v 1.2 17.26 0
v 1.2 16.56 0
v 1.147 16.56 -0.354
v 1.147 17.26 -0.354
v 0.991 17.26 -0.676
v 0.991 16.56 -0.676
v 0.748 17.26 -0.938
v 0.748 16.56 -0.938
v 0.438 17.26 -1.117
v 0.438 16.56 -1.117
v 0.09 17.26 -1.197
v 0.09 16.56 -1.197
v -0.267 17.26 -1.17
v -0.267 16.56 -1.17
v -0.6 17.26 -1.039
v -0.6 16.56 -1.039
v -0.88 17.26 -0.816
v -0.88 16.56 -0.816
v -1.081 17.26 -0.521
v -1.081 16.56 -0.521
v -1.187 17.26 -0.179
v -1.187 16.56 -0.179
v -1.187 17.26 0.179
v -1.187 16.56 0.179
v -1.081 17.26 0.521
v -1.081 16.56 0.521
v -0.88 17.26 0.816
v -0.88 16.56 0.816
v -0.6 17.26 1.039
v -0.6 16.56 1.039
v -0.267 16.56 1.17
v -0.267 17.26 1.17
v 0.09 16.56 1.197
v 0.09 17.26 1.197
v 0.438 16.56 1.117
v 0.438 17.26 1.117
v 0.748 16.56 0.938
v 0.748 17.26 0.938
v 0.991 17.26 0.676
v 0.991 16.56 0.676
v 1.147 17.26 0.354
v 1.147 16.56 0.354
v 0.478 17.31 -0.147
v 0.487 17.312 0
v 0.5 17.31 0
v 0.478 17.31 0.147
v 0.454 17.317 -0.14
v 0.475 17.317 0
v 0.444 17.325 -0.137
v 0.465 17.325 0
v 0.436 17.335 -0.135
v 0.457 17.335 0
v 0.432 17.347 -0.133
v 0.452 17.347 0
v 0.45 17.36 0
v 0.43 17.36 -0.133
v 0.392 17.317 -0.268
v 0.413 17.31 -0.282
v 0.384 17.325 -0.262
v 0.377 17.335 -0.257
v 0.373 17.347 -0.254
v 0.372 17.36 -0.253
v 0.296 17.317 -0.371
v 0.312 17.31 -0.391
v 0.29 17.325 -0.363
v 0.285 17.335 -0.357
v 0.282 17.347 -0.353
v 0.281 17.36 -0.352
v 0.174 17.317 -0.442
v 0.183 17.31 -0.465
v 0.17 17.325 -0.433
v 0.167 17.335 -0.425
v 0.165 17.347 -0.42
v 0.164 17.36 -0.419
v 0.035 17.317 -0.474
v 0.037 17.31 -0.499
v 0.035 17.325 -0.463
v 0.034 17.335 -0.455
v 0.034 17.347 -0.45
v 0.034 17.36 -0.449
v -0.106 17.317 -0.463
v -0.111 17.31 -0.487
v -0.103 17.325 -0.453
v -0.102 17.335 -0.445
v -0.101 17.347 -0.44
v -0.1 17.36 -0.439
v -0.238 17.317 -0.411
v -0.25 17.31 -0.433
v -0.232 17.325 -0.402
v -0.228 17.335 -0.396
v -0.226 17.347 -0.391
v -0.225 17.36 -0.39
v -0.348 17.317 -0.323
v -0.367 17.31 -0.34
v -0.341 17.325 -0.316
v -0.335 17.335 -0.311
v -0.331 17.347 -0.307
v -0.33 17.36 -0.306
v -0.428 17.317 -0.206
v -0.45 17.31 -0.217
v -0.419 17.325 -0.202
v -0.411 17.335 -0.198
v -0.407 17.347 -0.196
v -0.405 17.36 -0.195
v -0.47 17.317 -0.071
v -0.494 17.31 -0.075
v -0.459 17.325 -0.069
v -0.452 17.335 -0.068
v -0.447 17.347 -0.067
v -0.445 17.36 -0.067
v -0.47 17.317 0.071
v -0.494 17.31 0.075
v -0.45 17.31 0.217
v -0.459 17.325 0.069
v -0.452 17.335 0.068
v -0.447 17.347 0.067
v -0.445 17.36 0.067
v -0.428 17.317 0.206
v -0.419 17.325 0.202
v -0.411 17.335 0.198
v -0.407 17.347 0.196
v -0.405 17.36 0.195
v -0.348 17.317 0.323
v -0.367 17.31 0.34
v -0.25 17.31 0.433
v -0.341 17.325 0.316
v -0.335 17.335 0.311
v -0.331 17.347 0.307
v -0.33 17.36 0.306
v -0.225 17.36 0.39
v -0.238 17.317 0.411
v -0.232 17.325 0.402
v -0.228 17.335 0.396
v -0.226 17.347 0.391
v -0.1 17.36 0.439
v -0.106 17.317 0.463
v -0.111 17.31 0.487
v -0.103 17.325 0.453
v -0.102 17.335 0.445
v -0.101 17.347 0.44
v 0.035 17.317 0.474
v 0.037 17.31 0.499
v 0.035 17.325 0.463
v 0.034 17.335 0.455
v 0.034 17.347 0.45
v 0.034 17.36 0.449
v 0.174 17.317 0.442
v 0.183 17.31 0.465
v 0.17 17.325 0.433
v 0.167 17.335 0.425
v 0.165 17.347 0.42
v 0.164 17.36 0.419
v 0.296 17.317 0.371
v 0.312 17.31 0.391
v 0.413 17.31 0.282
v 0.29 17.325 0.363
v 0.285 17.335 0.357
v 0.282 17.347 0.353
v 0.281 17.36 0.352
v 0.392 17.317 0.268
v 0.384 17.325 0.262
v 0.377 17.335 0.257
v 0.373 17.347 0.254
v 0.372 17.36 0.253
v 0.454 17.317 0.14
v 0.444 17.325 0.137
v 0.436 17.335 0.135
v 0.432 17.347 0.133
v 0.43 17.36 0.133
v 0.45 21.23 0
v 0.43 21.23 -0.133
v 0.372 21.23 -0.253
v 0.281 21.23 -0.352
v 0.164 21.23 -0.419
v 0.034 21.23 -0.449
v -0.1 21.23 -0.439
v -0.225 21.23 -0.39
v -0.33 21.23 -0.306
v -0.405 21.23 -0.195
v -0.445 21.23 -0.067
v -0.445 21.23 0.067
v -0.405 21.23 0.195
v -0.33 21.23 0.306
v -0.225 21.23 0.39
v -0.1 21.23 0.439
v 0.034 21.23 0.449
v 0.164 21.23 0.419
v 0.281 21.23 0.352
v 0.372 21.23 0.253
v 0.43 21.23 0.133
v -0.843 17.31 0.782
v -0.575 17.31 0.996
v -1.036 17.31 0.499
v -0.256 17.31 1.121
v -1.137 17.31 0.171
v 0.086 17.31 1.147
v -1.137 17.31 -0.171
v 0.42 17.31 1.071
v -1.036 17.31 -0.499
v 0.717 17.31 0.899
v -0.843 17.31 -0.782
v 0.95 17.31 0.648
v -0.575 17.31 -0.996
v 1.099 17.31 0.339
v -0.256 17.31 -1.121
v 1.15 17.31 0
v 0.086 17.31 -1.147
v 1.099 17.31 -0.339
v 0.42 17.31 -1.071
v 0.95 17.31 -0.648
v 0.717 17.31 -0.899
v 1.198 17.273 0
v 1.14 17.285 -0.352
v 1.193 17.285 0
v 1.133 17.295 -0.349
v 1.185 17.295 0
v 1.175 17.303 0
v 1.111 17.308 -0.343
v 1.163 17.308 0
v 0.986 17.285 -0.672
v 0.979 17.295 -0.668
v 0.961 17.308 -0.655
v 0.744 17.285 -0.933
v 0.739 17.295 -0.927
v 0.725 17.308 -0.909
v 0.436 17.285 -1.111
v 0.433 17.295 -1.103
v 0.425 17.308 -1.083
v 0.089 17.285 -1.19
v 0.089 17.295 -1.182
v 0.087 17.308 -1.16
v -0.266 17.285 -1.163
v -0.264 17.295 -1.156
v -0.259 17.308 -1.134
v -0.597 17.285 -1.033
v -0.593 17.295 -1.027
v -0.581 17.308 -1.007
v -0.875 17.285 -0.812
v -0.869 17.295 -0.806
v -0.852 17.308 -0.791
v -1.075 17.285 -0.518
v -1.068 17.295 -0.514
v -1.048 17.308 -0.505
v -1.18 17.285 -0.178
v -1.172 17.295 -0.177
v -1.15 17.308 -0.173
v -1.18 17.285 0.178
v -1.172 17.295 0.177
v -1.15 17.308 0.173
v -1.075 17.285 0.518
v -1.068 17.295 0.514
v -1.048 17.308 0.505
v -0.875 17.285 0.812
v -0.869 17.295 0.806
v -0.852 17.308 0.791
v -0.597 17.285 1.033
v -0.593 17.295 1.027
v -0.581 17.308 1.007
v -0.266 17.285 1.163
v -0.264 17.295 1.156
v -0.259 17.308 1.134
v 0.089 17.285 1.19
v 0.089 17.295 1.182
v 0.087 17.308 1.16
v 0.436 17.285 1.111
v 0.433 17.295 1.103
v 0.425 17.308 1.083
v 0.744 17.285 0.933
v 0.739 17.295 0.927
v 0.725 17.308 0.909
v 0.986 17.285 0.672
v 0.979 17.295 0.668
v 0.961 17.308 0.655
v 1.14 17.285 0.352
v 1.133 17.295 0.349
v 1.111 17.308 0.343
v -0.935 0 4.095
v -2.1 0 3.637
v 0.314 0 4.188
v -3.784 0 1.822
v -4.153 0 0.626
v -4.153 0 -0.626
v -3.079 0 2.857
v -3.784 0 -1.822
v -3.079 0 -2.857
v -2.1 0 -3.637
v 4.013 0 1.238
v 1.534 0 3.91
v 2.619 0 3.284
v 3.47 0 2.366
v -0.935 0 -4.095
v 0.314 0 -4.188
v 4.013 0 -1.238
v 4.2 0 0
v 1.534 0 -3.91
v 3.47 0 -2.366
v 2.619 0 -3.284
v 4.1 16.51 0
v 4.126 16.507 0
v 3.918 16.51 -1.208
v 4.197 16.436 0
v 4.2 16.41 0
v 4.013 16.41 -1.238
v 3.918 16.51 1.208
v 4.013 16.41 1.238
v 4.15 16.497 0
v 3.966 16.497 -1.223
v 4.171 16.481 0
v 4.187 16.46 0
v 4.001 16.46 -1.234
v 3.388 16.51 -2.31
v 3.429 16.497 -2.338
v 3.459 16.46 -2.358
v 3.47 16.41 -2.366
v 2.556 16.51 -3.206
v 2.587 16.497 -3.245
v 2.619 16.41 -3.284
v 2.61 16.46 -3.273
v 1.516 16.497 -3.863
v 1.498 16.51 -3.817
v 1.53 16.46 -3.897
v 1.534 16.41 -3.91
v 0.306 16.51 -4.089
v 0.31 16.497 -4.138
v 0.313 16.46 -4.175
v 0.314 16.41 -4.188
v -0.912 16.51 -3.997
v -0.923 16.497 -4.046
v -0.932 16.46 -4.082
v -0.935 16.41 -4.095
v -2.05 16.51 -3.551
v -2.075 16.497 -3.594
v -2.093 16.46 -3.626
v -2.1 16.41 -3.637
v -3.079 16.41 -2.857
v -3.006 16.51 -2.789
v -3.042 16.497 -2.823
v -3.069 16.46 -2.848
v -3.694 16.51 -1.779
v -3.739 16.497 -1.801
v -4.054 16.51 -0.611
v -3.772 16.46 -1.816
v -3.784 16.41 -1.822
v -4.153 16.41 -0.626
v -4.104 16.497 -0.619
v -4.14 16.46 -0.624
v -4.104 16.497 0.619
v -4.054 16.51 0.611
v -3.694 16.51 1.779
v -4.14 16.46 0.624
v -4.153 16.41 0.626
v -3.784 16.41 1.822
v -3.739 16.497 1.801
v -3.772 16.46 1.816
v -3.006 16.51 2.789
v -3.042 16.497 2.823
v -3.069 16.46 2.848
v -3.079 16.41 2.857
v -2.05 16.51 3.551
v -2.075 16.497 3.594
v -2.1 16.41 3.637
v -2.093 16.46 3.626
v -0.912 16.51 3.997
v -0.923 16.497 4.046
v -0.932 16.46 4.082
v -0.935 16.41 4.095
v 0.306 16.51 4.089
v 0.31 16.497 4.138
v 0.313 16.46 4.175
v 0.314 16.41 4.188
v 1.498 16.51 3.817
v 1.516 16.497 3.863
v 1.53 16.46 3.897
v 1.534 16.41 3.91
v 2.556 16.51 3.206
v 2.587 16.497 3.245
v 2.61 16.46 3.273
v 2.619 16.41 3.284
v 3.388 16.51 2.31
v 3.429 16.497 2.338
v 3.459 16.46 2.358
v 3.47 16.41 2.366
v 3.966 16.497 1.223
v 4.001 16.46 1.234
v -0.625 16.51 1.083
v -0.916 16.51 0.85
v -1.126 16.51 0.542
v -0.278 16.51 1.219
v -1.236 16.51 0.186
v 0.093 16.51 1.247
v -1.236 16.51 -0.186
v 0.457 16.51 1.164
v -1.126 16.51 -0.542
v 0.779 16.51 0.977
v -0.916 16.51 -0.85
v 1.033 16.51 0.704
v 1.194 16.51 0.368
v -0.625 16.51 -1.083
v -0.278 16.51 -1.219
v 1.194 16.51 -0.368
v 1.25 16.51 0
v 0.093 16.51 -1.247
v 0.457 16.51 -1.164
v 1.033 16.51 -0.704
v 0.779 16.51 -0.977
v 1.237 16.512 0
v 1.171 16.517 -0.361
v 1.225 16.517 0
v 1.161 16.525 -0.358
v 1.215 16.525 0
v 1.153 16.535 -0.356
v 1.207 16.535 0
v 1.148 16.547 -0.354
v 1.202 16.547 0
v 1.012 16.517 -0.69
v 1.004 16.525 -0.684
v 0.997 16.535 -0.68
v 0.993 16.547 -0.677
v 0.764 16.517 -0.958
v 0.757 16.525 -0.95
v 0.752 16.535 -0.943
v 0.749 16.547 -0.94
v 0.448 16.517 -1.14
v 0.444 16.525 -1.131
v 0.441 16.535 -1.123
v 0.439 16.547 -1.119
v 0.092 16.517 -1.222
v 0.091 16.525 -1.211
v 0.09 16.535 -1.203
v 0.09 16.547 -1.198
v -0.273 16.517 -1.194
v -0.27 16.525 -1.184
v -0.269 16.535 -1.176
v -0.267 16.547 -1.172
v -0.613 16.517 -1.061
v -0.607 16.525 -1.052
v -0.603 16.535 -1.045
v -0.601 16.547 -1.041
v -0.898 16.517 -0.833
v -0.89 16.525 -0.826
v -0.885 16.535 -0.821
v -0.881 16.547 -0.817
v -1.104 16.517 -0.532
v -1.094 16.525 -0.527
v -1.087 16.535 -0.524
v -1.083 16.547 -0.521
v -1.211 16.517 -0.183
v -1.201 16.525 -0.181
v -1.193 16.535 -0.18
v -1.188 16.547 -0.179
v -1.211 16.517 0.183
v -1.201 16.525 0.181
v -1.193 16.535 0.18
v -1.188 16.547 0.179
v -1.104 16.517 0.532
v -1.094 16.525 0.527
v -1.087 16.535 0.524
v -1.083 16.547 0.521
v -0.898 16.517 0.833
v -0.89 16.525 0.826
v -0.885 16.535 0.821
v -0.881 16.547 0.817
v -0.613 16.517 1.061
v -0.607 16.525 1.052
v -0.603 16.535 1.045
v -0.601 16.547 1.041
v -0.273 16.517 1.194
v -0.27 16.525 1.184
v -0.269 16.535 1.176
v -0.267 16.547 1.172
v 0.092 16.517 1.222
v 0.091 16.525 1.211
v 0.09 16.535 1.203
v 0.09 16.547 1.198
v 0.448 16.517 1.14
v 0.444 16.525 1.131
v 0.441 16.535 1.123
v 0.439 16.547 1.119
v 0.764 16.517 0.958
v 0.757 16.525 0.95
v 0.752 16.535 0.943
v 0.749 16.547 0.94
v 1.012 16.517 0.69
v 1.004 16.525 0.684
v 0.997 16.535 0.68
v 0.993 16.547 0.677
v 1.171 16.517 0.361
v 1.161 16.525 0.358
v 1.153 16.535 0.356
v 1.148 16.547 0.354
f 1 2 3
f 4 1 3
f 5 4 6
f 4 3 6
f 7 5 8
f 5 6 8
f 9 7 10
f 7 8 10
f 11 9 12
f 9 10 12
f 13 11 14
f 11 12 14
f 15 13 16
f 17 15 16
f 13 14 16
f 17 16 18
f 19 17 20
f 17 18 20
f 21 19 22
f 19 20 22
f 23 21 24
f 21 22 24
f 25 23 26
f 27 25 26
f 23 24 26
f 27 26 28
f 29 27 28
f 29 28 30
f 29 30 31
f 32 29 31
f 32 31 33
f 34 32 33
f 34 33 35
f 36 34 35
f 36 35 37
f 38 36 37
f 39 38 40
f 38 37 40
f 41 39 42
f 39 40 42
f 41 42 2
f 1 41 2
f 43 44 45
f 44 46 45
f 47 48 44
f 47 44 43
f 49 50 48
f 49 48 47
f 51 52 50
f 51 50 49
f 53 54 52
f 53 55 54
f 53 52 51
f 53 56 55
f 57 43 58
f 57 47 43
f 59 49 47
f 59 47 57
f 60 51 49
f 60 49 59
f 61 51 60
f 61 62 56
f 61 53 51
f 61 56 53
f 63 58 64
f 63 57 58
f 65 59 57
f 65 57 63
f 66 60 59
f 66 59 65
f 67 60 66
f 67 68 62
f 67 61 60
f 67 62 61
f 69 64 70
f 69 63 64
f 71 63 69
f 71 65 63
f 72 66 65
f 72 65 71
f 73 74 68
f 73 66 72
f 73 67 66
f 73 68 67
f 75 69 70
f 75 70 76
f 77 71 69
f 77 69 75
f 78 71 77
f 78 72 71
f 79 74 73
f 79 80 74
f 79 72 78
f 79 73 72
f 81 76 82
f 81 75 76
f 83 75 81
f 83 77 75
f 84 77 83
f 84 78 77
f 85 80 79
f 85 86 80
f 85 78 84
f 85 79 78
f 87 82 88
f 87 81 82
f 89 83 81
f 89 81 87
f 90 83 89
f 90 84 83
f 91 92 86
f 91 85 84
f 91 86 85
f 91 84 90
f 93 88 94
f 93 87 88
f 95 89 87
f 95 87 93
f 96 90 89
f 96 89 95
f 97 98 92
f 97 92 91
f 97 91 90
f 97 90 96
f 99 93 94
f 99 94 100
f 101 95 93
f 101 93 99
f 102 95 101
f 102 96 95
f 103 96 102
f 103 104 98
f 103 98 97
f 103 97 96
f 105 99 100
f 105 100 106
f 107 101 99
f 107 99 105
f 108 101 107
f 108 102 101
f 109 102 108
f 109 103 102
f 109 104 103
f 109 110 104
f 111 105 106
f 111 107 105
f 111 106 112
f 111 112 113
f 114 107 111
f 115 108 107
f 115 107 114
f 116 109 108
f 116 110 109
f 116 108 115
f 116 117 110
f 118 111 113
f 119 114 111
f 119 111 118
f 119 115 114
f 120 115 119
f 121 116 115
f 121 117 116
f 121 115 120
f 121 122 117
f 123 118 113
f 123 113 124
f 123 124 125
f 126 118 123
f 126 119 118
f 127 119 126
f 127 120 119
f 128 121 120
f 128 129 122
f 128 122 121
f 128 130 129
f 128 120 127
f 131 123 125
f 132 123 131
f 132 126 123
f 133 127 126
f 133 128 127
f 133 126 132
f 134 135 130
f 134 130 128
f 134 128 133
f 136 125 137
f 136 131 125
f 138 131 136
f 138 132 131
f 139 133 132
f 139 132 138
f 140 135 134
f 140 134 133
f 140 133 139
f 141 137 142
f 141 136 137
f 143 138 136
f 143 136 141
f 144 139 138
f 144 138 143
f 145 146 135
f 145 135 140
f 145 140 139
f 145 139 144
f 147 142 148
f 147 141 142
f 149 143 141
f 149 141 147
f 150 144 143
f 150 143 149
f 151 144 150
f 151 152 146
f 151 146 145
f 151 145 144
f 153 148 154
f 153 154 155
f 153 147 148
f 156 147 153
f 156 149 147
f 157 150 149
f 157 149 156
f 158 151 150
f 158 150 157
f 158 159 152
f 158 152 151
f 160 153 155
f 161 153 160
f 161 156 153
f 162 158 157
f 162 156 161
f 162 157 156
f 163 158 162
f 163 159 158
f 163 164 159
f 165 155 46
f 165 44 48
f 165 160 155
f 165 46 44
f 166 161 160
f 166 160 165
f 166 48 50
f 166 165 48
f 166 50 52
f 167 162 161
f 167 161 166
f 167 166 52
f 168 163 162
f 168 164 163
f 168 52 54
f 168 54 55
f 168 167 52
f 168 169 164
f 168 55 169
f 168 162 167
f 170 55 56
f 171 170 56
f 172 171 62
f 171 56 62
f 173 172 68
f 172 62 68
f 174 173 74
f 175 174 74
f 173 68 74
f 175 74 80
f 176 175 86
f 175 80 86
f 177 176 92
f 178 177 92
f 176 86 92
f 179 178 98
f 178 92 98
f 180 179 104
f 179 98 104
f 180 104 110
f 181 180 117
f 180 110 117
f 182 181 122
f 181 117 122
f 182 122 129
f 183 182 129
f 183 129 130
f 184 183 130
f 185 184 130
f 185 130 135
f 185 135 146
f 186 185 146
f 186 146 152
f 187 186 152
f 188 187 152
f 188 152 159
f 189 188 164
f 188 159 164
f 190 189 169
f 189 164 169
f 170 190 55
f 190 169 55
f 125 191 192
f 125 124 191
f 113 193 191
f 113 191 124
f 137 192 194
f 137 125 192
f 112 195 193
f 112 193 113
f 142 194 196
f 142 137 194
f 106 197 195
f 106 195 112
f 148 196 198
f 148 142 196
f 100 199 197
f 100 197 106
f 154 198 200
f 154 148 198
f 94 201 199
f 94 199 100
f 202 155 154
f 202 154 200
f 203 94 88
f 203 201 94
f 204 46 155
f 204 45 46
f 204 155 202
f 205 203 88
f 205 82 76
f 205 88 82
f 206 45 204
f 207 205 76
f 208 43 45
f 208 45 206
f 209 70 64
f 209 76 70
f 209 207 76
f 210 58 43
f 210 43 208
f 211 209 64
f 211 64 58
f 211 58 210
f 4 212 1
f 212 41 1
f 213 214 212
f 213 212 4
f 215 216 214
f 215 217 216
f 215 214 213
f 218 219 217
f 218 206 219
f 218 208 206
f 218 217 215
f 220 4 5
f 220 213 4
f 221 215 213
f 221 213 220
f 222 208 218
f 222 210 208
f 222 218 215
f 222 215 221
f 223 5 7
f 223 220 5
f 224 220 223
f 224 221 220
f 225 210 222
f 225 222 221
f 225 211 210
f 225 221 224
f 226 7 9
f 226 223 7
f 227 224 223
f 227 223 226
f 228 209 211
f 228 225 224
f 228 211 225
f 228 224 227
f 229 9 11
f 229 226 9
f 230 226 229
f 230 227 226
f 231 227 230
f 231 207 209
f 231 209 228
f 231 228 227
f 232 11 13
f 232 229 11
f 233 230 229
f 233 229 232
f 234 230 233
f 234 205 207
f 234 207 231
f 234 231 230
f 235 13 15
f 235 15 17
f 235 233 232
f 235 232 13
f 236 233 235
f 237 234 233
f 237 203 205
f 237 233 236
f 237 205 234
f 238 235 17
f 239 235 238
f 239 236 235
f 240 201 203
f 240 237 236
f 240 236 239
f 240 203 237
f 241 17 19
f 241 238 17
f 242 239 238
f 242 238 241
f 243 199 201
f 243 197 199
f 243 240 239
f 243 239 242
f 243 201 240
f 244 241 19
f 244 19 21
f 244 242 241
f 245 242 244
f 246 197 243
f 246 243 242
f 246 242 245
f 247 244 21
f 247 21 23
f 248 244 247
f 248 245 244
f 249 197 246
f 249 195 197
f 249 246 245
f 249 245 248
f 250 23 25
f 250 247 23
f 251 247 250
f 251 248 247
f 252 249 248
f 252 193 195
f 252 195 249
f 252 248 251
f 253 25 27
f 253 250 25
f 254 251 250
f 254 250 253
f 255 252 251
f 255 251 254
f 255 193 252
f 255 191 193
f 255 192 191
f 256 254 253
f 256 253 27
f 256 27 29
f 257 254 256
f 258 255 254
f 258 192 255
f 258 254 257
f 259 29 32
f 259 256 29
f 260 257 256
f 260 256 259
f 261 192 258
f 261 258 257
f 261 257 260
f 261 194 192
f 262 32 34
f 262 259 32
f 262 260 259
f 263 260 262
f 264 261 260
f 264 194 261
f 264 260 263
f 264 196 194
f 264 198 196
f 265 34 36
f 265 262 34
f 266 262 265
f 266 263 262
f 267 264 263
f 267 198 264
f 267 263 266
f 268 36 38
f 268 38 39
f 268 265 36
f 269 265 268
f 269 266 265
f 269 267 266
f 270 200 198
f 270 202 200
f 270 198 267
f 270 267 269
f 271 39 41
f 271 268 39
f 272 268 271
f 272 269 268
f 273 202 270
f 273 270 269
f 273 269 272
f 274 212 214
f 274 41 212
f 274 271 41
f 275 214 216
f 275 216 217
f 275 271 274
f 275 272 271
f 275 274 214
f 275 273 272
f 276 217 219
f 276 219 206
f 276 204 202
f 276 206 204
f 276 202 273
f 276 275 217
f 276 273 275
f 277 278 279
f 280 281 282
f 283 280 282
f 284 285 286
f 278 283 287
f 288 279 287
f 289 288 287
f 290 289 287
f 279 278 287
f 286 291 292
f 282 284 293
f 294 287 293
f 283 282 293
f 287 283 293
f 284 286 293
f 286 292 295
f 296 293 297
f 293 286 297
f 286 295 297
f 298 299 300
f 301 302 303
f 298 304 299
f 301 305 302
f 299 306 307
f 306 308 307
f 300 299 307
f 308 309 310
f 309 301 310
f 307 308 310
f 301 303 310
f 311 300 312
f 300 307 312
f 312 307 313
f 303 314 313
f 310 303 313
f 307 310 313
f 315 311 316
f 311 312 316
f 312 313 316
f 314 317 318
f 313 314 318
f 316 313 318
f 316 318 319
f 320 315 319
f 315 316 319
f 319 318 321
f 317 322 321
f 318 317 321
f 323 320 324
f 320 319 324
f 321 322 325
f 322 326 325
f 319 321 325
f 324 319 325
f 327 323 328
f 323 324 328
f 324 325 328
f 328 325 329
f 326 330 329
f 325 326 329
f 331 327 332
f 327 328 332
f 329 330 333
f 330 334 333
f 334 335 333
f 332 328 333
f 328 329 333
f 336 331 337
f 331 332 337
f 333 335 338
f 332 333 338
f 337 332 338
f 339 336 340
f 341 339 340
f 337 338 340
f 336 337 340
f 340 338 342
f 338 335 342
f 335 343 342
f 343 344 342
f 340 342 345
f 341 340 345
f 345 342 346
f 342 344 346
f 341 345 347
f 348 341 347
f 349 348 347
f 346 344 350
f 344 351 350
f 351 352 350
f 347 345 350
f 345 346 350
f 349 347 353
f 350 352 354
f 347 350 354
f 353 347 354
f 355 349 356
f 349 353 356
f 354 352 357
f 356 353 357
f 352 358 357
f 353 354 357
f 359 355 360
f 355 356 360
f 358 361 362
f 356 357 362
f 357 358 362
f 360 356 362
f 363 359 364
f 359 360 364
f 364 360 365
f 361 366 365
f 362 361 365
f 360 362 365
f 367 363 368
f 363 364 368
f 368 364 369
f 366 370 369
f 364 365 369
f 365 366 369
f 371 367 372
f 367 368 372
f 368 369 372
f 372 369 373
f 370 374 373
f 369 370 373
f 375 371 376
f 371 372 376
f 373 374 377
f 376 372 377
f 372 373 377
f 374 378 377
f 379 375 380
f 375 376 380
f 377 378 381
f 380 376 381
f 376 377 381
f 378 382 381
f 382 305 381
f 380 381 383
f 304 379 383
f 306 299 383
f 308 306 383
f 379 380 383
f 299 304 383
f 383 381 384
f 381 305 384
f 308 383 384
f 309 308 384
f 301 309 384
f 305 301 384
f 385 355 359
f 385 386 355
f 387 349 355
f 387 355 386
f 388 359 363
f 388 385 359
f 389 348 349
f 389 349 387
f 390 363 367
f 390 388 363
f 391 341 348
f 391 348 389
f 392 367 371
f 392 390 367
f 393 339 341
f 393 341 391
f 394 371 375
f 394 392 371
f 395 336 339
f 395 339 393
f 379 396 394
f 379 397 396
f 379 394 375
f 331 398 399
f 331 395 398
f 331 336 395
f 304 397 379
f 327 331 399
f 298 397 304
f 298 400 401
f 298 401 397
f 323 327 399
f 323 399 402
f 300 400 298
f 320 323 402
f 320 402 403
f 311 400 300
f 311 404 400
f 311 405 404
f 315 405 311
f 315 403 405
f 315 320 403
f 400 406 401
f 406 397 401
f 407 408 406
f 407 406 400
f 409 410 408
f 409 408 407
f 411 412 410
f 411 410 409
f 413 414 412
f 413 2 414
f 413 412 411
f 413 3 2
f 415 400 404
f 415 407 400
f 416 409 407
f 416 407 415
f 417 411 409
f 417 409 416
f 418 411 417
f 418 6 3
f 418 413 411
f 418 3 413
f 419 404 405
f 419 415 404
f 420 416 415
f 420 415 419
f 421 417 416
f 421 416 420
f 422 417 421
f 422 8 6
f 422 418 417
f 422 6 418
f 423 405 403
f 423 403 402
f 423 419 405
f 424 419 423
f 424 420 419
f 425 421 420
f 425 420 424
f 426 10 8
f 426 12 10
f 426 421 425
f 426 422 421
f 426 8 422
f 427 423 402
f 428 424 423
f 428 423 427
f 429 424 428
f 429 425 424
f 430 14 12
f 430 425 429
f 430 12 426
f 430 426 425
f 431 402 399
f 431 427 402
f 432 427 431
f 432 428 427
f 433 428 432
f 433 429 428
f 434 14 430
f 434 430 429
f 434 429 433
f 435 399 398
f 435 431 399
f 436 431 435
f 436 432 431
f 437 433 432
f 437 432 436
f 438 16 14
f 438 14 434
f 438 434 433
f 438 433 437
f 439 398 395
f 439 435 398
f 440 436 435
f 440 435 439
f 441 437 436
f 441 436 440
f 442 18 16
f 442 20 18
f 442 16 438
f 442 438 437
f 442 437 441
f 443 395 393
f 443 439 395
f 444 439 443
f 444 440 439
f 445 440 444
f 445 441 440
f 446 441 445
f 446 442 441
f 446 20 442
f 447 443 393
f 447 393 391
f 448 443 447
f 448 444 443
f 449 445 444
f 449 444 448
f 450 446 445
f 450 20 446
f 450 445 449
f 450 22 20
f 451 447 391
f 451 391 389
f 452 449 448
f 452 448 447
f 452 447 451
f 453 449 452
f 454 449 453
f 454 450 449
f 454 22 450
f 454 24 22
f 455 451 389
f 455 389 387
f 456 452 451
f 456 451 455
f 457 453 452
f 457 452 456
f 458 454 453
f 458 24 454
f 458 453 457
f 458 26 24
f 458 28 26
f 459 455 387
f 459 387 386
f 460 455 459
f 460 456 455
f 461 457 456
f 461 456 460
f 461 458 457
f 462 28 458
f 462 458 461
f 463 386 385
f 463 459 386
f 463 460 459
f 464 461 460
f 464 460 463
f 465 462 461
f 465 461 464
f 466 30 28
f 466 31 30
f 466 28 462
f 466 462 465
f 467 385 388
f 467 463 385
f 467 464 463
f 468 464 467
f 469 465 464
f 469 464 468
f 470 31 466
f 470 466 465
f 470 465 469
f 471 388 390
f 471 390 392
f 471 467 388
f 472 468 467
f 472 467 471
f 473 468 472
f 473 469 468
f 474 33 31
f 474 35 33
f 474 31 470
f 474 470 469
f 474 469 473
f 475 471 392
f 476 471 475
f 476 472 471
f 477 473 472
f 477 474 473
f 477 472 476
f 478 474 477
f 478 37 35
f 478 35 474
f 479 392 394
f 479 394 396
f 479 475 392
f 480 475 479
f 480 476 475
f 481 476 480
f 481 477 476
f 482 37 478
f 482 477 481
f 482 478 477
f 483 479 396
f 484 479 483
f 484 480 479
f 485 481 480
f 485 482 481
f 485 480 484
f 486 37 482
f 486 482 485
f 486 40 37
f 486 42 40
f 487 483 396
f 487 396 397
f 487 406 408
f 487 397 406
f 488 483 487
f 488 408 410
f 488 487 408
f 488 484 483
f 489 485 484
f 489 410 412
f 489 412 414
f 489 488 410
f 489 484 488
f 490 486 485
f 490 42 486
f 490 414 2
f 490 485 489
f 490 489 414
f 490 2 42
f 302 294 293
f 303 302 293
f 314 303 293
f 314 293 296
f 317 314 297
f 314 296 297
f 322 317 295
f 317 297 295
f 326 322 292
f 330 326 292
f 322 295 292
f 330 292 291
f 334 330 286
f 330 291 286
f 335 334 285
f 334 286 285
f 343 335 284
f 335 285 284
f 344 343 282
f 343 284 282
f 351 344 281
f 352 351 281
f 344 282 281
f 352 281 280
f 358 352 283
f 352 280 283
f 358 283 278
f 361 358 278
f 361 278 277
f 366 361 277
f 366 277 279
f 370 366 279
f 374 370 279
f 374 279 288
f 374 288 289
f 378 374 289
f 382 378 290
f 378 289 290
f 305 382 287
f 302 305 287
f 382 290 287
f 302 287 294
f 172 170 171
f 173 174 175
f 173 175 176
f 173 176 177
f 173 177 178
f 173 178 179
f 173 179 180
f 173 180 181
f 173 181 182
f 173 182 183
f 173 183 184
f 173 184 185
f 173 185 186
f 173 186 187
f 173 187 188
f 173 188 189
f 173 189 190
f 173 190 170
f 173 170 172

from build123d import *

# Parameters (mm, degrees)
SKETCH1_R           = 4.2
BOSS_EXTRUDE1_DEPTH = 16.51
SKETCH2_R           = 1.2
BOSS_EXTRUDE2_DEPTH = 0.8
SKETCH3_R           = 0.45
BOSS_EXTRUDE3_DEPTH = 3.92
FILLET3_R           = 0.05
FILLET4_R           = 0.1


with BuildPart() as part:
    # Sketch1 → Boss-Extrude1 (new body)
    with BuildSketch(Plane(origin=(0, 0, 0), x_dir=(1, 0, 0), z_dir=(0, 1, 0))):
        Circle(SKETCH1_R)
    extrude(amount=BOSS_EXTRUDE1_DEPTH)

    # Sketch2 → Boss-Extrude2 (add)
    with BuildSketch(Plane(origin=(0, 16.51, 0), x_dir=(1, 0, 0), z_dir=(0, 1, 0))):
        Circle(SKETCH2_R)
    extrude(amount=BOSS_EXTRUDE2_DEPTH)

    # Sketch3 → Boss-Extrude3 (add)
    with BuildSketch(Plane(origin=(0, 17.31, 0), x_dir=(1, 0, 0), z_dir=(0, 1, 0))):
        Circle(SKETCH3_R)
    extrude(amount=BOSS_EXTRUDE3_DEPTH)

    # Fillet3
    fillet3_edges = [part.edges().sort_by_distance(p)[0] for p in [
        (-0.45, 17.31, 0),
        (-1.2, 16.51, 0),
        (-1.2, 17.31, 0),
    ]]
    fillet(fillet3_edges, radius=FILLET3_R)

    # Fillet4
    fillet4_edges = [part.edges().sort_by_distance(p)[0] for p in [
        (-4.2, 16.51, 0),
    ]]
    fillet(fillet4_edges, radius=FILLET4_R)


solid = part.part
